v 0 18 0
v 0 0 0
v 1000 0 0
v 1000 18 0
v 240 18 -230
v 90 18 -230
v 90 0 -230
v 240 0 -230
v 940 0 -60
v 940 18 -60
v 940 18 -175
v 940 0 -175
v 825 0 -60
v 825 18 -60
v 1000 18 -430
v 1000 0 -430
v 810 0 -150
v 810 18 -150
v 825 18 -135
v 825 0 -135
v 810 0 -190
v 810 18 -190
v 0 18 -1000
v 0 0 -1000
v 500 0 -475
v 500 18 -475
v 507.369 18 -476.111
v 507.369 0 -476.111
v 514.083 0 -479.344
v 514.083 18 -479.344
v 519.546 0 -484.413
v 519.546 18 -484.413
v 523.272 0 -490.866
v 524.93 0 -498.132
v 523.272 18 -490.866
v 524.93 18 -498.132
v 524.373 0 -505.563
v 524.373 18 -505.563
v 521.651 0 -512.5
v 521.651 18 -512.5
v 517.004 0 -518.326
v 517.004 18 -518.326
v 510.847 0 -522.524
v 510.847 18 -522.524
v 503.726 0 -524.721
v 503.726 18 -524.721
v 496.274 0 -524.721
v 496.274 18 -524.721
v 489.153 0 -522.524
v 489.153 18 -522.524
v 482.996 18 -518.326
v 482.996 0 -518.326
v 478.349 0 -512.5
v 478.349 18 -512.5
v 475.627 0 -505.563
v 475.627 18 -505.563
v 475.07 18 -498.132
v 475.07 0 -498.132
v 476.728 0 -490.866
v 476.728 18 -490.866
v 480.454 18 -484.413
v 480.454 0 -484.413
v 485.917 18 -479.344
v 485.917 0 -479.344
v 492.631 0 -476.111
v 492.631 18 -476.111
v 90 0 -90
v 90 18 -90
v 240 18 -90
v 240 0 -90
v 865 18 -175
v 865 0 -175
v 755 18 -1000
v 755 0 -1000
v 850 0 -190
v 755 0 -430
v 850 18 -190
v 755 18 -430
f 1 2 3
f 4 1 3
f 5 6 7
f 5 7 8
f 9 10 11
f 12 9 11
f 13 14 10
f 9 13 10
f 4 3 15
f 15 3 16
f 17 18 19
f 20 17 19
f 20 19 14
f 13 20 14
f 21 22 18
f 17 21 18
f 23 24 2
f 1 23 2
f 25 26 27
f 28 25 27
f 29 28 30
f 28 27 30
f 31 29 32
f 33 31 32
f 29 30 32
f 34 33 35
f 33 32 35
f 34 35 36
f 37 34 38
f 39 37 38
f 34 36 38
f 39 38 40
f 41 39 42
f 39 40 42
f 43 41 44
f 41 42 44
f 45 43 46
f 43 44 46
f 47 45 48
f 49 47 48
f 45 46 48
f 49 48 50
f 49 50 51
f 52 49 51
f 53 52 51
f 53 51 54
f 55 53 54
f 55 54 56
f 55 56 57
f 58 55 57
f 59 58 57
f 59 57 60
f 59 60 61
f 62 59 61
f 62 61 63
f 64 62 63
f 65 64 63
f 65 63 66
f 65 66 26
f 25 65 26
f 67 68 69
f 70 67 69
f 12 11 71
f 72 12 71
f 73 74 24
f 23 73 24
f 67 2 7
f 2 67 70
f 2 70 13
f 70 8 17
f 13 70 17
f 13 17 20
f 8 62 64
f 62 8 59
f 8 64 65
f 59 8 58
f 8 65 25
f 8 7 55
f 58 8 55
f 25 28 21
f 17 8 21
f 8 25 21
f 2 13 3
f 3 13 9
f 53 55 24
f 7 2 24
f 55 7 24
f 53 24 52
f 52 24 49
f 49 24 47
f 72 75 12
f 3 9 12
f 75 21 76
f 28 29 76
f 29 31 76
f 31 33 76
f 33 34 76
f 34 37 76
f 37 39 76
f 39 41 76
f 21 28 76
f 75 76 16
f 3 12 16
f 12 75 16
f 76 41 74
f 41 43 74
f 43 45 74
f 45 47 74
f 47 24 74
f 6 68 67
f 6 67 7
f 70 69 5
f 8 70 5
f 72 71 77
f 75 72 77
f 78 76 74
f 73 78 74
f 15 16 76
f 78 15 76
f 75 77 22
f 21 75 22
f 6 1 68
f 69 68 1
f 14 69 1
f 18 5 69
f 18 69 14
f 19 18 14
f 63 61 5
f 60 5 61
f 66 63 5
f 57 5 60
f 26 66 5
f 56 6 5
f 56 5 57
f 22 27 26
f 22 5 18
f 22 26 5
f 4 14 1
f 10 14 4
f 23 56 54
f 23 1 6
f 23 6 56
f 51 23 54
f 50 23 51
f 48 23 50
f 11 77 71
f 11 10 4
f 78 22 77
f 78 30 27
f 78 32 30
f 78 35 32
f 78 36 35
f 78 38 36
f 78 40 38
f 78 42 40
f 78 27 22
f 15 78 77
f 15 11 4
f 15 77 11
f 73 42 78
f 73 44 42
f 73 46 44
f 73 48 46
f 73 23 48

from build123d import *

# Parameters (mm, degrees)
BOSS_EXTRUDE1_DEPTH = 18
SKETCH3_W           = 150
SKETCH3_H           = 140
CUT_EXTRUDE2_DEPTH  = 18
CUT_EXTRUDE3_DEPTH  = 18
SKETCH5_R           = 25
CUT_EXTRUDE4_DEPTH  = 1415.328109033


with BuildPart() as part:
    # Sketch1 → Boss-Extrude1 (new body)
    with BuildSketch(Plane(origin=(0, 0, 0), x_dir=(1, 0, 0), z_dir=(0, 1, 0))):
        Polygon((0, 0), (1000, 0), (1000, 430), (755, 430), (755, 1000), (0, 1000), align=None)
    extrude(amount=BOSS_EXTRUDE1_DEPTH)

    # Sketch3 → Cut-Extrude2 (cut)
    with BuildSketch(Plane(origin=(0, 18, 0), x_dir=(1, 0, 0), z_dir=(0, 1, 0))):
        with Locations((165, 160)):
            Rectangle(SKETCH3_W, SKETCH3_H)
    extrude(amount=-CUT_EXTRUDE2_DEPTH, mode=Mode.SUBTRACT)

    # Sketch4 → Cut-Extrude3 (cut)
    with BuildSketch(Plane(origin=(0, 18, 0), x_dir=(1, 0, 0), z_dir=(0, 1, 0))):
        Polygon((940, 60), (940, 175), (865, 175), (850, 190), (810, 190), (810, 150), (825, 135), (825, 60), align=None)
    extrude(amount=-CUT_EXTRUDE3_DEPTH, mode=Mode.SUBTRACT)

    # Sketch5 → Cut-Extrude4 (cut, through all)
    with BuildSketch(Plane(origin=(0, 18, 0), x_dir=(1, 0, 0), z_dir=(0, 1, 0))):
        with Locations(Location((500, 500, 0), (0, 0, 270))):
            Circle(SKETCH5_R)
    extrude(amount=-CUT_EXTRUDE4_DEPTH, mode=Mode.SUBTRACT)


solid = part.part
